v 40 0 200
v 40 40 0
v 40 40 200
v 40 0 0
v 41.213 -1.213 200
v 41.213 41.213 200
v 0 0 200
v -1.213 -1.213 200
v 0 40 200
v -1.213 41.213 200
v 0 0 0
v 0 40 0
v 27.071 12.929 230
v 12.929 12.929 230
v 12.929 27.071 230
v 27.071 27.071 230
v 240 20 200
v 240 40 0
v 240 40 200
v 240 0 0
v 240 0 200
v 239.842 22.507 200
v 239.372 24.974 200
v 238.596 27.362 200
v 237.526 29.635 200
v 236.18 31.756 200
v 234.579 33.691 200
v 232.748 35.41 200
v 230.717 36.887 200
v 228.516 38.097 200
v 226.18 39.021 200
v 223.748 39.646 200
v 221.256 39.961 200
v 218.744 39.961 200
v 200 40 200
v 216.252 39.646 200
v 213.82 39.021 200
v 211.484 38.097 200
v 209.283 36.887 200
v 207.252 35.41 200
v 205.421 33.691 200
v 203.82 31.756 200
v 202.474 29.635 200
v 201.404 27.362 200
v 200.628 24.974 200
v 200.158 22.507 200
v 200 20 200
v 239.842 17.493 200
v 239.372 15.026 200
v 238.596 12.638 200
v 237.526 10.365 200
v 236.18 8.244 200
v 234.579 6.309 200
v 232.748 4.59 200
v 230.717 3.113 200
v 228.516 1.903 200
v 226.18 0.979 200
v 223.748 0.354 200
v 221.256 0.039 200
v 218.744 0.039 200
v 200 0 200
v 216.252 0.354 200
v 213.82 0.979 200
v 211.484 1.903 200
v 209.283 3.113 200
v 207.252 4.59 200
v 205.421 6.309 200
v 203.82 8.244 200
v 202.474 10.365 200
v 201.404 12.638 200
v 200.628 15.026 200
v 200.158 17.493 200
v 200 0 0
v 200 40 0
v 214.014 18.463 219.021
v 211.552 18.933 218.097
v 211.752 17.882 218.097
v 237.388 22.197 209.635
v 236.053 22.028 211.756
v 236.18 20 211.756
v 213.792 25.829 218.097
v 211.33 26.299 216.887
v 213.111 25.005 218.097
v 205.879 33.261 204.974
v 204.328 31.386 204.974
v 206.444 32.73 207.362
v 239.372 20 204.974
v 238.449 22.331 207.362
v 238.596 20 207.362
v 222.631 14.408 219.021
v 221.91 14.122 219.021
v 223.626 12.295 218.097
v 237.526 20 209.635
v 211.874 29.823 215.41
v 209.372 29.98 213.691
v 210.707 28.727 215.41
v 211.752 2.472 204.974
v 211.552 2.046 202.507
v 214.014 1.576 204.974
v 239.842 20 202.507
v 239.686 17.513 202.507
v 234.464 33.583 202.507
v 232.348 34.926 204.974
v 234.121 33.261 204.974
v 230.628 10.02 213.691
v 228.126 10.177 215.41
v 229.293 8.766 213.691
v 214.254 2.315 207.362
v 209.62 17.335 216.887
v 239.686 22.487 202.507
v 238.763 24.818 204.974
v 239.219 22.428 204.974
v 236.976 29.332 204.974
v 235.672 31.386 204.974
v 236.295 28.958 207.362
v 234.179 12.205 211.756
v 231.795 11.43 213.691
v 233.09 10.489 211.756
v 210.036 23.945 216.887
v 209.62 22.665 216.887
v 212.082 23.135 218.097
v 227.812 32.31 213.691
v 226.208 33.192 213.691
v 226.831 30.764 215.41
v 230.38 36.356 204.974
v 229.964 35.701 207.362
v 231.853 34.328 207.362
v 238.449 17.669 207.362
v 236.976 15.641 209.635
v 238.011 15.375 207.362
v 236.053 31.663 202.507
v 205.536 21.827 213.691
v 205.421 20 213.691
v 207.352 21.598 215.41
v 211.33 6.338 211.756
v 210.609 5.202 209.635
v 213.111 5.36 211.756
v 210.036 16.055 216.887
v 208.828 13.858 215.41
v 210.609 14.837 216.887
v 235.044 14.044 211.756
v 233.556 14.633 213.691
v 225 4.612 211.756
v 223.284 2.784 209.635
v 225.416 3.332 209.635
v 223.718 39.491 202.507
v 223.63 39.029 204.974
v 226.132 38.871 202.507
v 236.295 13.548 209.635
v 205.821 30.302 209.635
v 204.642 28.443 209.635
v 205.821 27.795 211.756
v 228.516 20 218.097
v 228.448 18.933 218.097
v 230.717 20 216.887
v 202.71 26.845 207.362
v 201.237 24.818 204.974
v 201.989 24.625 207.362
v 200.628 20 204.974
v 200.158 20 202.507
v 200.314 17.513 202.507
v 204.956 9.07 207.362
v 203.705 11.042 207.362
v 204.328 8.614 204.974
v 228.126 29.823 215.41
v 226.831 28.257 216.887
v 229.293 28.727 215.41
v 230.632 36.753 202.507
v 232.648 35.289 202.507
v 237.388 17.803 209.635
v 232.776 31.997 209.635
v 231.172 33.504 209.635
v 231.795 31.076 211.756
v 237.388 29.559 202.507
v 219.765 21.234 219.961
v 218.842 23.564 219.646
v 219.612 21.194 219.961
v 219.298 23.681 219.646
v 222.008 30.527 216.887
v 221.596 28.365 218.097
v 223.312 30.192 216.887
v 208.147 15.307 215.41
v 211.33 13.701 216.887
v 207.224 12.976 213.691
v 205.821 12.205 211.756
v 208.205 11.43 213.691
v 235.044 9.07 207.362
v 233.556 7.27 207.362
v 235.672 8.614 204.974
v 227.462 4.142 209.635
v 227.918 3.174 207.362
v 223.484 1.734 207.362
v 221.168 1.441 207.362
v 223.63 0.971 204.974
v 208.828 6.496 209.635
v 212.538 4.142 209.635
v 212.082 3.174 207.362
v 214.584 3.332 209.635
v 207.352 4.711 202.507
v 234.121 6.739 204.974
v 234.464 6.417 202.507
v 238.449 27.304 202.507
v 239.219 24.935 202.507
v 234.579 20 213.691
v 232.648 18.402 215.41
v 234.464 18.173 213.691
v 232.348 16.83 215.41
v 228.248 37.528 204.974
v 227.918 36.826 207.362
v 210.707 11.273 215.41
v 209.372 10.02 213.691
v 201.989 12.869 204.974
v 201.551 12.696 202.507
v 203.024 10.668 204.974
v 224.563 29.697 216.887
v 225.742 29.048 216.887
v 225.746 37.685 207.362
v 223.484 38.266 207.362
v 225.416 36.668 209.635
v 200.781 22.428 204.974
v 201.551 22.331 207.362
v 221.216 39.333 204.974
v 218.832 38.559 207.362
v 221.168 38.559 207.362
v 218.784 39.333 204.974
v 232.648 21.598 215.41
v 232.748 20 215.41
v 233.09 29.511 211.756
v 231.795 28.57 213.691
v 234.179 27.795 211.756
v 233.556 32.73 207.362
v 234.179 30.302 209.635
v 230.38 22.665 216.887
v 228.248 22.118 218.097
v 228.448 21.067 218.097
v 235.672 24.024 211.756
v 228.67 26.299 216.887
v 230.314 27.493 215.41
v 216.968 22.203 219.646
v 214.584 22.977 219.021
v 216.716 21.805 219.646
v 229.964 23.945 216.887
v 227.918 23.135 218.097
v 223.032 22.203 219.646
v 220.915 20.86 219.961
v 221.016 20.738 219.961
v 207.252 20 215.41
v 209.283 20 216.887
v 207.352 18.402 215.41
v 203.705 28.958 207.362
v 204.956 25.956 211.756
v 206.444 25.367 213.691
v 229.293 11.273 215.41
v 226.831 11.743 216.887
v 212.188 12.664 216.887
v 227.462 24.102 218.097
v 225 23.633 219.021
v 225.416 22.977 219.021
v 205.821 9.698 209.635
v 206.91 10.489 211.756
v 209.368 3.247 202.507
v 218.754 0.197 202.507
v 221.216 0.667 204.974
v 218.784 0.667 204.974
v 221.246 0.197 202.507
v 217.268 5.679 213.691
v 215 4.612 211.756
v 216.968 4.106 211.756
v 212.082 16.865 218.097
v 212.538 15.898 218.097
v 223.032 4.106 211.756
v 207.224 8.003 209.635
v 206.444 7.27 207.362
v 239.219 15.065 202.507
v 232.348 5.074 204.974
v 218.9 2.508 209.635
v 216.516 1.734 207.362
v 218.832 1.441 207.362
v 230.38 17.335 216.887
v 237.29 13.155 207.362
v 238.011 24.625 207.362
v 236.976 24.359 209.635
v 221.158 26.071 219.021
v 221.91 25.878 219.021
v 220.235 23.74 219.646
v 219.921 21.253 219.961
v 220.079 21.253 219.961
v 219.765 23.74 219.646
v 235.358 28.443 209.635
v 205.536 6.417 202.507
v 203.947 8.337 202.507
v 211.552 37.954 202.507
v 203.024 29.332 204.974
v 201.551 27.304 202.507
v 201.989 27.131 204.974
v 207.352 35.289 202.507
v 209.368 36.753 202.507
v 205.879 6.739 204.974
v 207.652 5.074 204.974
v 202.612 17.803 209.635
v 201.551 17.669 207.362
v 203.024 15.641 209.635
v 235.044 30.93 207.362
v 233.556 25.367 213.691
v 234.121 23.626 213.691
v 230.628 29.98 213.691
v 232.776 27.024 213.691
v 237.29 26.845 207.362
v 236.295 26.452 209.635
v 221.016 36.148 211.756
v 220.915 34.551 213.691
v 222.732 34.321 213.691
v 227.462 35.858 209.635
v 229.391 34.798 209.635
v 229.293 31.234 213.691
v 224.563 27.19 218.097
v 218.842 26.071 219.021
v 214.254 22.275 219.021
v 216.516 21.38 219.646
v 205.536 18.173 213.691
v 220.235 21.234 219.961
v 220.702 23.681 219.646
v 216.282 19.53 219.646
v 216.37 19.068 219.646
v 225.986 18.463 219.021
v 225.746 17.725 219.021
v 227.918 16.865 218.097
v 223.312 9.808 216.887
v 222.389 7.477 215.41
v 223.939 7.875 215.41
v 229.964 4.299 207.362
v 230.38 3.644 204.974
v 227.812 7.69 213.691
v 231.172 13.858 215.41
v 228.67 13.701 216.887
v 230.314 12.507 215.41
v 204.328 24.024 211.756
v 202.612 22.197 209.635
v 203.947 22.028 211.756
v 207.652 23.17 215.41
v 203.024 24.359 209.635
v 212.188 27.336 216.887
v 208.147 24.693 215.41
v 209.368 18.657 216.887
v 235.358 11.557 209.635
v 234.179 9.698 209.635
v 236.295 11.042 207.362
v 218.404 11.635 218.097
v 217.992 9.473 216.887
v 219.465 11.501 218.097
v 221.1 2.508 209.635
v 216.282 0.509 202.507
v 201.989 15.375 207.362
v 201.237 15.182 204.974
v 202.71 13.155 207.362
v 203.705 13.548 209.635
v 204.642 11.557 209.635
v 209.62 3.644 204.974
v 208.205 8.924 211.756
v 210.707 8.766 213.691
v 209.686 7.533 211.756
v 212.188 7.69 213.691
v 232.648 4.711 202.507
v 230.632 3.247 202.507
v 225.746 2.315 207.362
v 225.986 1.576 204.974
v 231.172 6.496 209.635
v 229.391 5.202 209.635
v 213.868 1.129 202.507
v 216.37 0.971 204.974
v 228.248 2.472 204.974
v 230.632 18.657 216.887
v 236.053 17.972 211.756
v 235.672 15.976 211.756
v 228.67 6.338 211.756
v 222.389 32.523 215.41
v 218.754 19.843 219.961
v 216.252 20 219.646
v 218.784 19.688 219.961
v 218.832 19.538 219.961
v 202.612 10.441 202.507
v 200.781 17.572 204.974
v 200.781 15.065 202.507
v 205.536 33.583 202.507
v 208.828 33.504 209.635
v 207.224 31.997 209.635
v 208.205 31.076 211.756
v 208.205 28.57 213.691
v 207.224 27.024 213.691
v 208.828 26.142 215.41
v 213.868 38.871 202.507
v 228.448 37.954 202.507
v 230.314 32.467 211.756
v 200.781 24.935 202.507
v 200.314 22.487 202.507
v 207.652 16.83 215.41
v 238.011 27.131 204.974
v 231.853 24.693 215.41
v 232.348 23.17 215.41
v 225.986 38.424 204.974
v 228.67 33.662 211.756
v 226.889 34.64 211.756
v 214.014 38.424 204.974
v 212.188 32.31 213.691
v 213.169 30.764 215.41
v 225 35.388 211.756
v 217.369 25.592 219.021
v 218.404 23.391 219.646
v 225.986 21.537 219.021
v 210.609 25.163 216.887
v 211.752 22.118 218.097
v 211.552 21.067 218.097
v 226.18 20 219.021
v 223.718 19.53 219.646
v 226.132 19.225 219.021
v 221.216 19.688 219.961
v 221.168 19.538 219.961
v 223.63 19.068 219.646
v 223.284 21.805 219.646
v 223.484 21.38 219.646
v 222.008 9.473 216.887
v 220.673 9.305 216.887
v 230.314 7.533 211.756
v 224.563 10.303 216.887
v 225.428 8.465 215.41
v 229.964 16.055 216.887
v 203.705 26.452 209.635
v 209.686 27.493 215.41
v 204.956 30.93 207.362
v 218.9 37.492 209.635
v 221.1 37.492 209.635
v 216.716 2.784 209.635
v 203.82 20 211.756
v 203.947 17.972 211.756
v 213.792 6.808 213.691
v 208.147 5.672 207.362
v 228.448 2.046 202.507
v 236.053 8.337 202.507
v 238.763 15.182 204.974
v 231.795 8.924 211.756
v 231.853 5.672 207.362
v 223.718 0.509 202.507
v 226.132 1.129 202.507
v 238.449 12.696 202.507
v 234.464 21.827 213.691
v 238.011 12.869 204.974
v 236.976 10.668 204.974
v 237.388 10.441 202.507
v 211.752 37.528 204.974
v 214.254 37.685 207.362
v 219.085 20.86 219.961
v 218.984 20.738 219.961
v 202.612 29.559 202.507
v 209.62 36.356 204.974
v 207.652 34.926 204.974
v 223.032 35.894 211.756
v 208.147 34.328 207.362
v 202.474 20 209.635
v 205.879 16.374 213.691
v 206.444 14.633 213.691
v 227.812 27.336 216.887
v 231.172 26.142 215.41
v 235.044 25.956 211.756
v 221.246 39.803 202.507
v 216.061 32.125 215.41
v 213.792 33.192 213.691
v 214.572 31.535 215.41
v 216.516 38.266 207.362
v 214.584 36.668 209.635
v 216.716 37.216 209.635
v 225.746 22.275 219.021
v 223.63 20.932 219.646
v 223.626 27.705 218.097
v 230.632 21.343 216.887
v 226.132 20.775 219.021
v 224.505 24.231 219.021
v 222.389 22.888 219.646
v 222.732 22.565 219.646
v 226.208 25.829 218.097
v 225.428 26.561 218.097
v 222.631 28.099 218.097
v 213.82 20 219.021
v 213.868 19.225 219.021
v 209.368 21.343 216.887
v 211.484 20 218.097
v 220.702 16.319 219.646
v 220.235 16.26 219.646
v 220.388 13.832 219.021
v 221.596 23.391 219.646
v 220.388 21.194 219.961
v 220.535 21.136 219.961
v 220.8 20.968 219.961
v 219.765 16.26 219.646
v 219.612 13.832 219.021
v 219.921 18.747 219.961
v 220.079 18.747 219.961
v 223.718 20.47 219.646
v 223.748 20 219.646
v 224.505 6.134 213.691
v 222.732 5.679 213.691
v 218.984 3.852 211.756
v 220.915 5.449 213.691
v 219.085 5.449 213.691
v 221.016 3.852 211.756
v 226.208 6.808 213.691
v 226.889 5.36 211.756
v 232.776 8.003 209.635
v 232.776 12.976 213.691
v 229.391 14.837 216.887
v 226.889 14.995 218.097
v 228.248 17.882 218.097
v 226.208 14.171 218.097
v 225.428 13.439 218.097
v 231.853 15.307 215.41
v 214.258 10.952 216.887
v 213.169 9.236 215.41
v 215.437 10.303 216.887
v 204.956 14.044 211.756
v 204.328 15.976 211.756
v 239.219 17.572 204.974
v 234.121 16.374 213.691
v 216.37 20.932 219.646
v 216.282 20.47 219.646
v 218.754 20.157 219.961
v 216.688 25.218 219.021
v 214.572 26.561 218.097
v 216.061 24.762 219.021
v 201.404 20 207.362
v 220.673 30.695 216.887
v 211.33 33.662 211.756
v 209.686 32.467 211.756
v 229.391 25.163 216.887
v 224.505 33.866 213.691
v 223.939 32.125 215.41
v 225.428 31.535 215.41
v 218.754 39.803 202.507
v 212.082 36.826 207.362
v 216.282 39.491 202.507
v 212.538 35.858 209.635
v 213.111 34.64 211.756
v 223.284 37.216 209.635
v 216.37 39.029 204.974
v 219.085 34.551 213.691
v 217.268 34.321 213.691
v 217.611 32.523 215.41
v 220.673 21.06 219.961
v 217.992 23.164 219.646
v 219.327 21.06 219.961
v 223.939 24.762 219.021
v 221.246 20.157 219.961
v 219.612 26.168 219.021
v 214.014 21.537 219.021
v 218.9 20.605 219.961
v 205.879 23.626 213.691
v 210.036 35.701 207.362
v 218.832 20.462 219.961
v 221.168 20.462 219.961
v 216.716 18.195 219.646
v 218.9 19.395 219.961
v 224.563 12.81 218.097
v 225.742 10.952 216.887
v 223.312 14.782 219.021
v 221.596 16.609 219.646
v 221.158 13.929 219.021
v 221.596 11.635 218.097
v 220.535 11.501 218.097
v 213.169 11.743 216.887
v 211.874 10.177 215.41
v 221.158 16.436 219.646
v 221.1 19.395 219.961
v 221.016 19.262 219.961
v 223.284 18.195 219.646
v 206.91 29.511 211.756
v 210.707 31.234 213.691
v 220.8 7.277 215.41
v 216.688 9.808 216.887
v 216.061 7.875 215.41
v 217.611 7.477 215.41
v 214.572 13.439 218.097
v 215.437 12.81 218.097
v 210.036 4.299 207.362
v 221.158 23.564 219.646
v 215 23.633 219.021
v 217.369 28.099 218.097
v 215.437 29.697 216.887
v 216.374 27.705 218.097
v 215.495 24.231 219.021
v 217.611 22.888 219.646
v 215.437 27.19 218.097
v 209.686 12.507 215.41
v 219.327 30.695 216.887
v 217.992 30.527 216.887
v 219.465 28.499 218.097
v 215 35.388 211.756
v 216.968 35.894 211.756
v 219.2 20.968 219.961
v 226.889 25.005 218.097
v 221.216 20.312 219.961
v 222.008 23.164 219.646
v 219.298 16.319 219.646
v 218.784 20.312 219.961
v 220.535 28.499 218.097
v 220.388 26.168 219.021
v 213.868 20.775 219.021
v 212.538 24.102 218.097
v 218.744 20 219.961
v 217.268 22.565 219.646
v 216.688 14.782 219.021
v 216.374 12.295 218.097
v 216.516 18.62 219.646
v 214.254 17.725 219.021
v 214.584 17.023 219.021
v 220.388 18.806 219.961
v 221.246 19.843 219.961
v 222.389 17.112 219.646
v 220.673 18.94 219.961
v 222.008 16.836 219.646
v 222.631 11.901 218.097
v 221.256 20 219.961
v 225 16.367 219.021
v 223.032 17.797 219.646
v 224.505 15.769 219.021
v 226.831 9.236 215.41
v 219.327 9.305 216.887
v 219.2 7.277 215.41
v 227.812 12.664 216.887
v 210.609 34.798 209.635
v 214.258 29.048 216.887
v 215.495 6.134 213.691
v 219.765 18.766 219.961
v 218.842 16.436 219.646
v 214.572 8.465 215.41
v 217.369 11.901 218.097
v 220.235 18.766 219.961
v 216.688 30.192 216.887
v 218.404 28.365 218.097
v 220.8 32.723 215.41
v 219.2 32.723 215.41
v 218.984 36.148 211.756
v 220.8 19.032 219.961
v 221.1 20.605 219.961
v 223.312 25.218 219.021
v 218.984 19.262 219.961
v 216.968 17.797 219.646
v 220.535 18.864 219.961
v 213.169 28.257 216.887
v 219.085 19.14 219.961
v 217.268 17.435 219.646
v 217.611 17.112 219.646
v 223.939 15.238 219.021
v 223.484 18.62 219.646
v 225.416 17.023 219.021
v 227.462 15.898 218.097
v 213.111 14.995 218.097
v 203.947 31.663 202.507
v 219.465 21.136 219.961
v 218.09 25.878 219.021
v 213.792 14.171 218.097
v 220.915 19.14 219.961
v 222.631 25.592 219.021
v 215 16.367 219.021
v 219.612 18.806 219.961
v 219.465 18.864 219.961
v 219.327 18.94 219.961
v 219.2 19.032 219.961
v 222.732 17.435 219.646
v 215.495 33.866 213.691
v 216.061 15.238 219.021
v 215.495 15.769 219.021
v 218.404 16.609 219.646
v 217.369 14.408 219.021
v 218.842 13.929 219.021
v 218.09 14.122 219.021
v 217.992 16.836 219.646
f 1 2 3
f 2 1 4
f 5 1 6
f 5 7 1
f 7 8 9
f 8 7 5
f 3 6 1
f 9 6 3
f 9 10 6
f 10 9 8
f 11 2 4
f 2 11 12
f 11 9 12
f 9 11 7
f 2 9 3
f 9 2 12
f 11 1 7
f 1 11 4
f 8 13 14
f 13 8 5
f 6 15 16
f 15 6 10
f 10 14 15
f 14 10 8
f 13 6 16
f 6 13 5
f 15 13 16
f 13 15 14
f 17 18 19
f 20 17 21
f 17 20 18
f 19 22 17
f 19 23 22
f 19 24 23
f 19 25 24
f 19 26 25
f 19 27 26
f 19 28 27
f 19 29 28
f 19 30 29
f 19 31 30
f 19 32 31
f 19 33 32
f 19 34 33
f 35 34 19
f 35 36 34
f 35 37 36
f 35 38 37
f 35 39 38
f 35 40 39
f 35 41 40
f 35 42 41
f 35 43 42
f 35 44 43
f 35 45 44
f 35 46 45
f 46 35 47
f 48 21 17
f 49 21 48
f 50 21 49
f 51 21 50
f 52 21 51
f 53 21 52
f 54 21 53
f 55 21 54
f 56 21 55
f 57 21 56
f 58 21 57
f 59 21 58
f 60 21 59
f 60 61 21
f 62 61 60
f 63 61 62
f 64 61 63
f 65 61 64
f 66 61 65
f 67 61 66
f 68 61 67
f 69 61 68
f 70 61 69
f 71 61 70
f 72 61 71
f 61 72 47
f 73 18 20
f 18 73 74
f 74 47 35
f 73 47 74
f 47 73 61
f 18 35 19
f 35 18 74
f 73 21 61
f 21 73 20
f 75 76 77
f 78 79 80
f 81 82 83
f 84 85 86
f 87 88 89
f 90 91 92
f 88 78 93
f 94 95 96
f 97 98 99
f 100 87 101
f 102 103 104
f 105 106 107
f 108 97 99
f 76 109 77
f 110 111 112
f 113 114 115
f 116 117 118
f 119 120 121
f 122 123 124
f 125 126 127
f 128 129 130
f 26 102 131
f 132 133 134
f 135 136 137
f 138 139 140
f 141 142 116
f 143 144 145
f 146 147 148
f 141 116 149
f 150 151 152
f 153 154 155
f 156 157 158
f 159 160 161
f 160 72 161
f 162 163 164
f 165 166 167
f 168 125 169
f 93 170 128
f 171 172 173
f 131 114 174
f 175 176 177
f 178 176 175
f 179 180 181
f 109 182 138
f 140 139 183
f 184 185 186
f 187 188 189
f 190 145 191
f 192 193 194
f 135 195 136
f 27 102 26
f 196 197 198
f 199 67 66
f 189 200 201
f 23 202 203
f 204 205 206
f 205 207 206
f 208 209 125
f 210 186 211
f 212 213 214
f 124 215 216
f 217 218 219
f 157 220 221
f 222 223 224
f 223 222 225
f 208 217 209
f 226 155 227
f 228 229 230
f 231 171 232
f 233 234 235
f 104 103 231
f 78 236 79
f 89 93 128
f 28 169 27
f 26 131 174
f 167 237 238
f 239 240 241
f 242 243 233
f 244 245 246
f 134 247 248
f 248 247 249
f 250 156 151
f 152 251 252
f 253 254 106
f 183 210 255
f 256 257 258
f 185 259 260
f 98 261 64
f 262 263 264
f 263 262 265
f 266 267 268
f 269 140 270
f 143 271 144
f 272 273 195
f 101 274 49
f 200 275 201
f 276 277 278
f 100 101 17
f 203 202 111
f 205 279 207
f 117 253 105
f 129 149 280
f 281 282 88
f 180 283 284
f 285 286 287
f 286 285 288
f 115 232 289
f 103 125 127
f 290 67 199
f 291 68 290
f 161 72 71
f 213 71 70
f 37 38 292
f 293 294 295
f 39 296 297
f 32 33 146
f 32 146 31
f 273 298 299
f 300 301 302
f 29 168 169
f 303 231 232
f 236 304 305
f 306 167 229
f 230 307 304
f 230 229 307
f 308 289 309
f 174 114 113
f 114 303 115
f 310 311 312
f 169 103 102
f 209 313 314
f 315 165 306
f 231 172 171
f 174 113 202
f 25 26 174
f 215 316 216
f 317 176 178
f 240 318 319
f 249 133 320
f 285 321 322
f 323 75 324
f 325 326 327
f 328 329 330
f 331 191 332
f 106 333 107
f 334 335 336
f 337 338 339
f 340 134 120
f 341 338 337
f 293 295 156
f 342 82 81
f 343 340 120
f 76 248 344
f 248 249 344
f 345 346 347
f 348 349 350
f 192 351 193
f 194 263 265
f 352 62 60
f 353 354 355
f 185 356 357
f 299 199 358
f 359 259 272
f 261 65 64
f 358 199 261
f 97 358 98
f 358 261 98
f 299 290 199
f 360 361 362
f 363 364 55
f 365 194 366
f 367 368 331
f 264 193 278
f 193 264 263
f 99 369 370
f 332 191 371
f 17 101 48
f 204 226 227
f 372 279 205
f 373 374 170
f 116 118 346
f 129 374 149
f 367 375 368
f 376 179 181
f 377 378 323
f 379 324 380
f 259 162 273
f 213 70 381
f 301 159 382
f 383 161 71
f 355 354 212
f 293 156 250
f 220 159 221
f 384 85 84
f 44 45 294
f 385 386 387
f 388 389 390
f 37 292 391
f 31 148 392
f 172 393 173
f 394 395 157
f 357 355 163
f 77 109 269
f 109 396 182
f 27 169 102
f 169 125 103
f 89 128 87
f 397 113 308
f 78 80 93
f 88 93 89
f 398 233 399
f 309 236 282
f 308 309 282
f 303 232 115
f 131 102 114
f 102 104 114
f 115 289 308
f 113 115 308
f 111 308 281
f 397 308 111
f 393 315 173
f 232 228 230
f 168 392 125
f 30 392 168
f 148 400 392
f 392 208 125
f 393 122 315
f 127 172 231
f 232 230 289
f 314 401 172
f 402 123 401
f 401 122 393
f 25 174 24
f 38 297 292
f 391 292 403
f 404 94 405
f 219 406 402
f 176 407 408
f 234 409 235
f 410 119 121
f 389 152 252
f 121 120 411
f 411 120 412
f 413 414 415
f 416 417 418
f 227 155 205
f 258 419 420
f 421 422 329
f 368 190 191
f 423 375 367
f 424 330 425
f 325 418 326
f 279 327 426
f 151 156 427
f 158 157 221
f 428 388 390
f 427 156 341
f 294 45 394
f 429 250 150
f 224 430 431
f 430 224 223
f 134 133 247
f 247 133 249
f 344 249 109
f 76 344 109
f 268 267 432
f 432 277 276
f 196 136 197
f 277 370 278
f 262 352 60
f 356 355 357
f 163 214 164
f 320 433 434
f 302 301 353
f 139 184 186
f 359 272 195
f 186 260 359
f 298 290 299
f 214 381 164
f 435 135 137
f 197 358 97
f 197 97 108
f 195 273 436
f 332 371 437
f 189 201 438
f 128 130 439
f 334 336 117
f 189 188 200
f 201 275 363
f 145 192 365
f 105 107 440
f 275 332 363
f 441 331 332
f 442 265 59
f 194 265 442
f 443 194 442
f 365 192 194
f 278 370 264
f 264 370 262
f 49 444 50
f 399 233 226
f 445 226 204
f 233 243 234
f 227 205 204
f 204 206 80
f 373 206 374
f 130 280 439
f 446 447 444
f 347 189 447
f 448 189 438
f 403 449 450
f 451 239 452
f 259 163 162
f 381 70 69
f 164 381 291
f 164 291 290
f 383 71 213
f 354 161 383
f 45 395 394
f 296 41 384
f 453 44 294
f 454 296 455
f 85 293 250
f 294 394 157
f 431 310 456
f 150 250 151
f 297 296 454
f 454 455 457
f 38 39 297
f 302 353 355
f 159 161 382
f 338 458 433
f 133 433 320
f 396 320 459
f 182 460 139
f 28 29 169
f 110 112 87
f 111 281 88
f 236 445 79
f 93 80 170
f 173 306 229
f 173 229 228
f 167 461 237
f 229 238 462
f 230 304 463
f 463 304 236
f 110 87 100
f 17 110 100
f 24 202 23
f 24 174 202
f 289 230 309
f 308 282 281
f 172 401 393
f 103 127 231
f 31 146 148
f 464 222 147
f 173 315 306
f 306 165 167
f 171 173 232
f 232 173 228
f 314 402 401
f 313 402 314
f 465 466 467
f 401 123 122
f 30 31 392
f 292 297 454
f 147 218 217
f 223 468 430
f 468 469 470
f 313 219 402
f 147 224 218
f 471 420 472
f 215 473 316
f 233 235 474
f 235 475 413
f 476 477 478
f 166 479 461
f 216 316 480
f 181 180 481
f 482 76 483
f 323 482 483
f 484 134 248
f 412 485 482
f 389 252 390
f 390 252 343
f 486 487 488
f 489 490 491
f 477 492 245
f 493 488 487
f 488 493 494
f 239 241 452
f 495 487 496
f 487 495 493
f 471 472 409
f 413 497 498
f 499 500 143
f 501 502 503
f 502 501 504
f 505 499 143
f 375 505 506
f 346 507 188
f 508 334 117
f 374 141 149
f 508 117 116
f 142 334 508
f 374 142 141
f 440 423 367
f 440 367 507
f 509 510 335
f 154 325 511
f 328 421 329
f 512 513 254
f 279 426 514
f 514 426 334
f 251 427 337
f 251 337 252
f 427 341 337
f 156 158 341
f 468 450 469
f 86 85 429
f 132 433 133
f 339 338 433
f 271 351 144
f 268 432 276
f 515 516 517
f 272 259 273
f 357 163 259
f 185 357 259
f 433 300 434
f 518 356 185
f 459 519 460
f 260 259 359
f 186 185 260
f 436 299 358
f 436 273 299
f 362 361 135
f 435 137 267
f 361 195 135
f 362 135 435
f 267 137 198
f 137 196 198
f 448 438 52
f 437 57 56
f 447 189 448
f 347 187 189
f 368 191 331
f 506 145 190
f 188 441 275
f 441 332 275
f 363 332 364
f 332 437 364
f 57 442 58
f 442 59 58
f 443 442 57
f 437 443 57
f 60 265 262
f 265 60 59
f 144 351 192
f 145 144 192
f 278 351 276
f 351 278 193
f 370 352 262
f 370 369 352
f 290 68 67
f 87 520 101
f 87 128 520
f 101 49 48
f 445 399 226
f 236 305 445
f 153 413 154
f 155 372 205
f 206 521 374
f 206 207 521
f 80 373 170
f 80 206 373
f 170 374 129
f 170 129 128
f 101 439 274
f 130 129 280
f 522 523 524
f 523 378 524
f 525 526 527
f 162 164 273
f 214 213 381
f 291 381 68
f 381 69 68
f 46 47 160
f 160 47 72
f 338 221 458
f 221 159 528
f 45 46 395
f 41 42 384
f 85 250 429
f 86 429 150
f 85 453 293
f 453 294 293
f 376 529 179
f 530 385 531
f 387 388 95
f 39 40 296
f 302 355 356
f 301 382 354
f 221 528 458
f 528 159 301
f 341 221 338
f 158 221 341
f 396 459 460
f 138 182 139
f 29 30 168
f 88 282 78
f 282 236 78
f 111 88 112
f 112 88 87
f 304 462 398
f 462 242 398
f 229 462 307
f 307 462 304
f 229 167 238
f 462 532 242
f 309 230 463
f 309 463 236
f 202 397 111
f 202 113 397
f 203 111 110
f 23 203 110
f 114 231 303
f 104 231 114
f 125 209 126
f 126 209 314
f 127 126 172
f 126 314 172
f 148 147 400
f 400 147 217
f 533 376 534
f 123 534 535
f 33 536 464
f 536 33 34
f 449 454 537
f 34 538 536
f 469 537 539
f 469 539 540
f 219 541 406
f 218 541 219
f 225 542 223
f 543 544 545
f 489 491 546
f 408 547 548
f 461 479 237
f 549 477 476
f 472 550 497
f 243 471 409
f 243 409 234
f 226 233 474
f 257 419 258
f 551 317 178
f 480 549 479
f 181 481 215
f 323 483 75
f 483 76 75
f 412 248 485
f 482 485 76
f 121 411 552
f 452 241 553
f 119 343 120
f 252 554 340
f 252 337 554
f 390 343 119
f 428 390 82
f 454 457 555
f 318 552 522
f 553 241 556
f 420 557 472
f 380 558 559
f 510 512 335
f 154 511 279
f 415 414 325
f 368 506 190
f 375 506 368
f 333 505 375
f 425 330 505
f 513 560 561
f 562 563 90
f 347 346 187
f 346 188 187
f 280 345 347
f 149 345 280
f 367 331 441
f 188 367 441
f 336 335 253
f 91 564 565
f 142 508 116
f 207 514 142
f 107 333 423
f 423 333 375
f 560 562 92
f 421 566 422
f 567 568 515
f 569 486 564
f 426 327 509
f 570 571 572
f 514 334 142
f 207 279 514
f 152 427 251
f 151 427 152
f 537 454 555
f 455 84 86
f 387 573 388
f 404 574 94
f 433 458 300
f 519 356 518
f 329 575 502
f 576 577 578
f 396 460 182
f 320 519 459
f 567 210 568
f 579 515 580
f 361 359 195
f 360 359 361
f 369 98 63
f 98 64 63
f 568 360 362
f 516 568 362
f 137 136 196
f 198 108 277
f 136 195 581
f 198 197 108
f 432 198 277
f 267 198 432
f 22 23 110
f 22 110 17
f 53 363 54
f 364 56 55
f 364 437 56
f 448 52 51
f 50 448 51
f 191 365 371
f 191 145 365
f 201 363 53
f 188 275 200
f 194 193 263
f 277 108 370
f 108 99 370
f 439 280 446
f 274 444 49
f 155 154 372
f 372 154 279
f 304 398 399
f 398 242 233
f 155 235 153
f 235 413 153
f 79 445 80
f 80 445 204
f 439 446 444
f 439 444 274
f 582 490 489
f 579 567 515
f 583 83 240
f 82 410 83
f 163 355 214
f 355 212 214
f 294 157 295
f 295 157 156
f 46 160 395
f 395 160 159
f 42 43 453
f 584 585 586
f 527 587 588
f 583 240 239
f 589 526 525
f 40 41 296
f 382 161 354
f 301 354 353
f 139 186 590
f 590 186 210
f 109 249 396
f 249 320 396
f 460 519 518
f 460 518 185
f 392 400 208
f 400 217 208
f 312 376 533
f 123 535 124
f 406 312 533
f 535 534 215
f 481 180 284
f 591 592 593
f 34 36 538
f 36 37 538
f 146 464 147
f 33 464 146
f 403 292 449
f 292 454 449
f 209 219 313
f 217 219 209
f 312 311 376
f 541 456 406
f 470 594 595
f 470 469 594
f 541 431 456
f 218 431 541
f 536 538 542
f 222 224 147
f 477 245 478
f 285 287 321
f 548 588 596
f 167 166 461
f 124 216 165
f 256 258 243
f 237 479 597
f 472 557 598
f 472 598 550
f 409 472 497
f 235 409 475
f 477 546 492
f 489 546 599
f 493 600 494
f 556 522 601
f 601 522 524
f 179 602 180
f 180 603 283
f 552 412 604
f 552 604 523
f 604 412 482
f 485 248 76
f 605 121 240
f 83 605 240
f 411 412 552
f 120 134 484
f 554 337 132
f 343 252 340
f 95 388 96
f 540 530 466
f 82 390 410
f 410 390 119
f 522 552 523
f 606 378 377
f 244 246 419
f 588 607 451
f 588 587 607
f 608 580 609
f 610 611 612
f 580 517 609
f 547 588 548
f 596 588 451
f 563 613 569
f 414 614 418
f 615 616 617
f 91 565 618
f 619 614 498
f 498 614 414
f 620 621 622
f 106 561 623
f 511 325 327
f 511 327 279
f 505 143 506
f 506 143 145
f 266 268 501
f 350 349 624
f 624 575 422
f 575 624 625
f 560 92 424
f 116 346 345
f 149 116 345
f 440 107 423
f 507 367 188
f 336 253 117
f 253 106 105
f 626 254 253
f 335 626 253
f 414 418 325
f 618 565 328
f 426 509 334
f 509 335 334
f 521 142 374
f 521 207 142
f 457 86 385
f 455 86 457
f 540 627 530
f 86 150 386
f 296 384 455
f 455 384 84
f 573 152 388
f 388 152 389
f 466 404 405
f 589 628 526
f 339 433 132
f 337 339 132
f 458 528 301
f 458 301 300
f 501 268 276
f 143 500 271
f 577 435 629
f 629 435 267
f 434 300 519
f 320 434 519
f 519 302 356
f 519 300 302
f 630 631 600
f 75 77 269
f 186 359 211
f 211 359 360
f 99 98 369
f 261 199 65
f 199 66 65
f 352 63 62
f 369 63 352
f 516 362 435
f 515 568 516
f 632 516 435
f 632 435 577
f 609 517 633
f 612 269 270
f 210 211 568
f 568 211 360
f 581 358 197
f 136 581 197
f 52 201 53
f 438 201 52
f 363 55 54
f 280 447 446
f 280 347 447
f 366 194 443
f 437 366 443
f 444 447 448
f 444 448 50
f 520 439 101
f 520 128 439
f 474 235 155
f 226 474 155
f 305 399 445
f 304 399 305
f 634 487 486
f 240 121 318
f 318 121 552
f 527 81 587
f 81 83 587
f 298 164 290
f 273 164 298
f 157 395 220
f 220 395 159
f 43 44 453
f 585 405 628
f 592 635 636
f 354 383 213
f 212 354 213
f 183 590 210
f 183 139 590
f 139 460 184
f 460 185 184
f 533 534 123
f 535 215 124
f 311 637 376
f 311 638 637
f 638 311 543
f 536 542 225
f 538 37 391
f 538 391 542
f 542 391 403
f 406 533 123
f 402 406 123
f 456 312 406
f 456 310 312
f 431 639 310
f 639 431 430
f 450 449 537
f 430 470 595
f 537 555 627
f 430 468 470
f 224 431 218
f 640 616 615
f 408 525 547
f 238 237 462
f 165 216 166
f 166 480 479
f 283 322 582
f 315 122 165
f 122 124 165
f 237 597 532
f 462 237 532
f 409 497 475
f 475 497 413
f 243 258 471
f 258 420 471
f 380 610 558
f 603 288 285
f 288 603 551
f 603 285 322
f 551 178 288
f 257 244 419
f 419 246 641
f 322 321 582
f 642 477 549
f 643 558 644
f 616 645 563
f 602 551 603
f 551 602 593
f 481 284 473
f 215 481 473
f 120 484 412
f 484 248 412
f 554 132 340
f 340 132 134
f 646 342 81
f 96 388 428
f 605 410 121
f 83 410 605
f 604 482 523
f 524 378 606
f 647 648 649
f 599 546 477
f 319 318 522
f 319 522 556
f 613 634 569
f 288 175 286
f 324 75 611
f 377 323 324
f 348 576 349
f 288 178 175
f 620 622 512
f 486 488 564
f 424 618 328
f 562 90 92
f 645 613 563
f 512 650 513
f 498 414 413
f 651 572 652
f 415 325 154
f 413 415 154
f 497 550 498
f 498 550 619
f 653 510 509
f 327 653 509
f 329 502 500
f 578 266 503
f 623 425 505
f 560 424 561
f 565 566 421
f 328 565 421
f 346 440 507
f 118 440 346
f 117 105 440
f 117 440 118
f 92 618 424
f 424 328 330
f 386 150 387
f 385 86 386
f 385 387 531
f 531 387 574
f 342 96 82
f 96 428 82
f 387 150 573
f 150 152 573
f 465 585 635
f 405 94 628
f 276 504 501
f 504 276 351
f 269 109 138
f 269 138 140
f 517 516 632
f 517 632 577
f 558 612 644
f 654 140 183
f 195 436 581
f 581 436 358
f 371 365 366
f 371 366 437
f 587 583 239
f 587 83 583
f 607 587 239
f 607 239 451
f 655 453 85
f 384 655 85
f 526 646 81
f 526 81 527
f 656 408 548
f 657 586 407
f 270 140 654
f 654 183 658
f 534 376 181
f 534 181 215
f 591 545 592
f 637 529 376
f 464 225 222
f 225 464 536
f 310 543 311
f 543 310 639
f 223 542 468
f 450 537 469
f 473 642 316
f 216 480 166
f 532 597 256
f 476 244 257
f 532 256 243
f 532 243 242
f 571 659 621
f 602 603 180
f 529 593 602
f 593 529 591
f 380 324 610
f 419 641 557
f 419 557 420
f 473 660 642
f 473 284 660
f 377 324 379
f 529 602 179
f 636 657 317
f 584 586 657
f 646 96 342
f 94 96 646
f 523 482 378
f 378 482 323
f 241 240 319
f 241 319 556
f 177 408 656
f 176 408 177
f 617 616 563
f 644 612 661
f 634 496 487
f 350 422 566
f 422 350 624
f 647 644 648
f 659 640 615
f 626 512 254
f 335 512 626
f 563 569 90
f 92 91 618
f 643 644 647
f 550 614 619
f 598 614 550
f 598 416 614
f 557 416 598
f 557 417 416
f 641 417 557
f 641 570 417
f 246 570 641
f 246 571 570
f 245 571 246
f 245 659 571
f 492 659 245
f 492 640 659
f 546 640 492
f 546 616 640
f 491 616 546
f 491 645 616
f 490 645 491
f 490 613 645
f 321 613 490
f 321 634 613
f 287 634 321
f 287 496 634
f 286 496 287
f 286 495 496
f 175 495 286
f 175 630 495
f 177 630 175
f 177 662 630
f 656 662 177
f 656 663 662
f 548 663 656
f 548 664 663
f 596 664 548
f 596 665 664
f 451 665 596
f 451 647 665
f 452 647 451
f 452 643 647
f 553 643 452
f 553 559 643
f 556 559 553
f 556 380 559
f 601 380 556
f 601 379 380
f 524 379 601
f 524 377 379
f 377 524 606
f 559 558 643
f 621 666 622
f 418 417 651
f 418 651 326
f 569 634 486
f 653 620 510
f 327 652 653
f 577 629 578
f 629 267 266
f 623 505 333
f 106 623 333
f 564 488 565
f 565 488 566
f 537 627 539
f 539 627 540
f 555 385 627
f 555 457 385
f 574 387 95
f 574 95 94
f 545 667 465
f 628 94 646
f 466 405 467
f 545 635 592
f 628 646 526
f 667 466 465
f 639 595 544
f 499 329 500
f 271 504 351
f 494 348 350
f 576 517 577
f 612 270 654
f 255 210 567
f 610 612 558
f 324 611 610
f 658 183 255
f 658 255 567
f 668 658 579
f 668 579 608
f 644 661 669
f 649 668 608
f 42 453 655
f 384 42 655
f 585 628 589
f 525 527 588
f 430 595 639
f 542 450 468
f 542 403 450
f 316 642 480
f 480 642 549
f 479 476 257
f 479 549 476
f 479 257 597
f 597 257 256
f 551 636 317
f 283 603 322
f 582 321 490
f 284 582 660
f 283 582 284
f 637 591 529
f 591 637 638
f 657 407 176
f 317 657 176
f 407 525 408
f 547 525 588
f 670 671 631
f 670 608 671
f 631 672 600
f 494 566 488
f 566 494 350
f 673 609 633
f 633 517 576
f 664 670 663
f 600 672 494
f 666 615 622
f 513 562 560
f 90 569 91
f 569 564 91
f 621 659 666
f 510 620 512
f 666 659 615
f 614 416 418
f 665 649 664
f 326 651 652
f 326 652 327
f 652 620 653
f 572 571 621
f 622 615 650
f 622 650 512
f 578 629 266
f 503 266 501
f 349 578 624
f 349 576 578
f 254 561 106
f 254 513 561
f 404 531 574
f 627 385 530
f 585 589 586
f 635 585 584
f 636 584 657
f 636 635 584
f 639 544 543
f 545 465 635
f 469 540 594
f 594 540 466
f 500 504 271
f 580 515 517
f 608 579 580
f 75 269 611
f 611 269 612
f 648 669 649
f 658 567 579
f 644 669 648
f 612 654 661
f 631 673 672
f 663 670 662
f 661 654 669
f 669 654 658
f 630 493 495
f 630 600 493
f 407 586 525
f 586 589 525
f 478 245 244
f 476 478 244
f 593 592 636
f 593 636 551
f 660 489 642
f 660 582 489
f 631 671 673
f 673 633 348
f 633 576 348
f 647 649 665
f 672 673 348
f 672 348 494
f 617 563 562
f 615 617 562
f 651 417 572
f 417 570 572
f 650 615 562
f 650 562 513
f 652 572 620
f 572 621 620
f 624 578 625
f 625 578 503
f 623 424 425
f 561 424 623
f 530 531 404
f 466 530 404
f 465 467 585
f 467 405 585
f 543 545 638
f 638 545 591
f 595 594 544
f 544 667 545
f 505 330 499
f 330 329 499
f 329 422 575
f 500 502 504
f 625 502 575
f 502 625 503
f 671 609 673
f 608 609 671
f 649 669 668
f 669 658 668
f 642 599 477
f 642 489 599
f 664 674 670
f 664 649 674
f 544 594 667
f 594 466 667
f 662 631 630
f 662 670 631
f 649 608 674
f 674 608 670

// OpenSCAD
// CUBO
cube([40,40,200]);
translate([20,20,200])
rotate([0,0,45])
color("cyan")
cylinder(30,30,10,$fn=4);




// CON CUPULA
translate([200,0,0])
cube([40,40,200]);
translate([220,20,200])
color("cyan")
sphere(r = 20,$fn=50);
